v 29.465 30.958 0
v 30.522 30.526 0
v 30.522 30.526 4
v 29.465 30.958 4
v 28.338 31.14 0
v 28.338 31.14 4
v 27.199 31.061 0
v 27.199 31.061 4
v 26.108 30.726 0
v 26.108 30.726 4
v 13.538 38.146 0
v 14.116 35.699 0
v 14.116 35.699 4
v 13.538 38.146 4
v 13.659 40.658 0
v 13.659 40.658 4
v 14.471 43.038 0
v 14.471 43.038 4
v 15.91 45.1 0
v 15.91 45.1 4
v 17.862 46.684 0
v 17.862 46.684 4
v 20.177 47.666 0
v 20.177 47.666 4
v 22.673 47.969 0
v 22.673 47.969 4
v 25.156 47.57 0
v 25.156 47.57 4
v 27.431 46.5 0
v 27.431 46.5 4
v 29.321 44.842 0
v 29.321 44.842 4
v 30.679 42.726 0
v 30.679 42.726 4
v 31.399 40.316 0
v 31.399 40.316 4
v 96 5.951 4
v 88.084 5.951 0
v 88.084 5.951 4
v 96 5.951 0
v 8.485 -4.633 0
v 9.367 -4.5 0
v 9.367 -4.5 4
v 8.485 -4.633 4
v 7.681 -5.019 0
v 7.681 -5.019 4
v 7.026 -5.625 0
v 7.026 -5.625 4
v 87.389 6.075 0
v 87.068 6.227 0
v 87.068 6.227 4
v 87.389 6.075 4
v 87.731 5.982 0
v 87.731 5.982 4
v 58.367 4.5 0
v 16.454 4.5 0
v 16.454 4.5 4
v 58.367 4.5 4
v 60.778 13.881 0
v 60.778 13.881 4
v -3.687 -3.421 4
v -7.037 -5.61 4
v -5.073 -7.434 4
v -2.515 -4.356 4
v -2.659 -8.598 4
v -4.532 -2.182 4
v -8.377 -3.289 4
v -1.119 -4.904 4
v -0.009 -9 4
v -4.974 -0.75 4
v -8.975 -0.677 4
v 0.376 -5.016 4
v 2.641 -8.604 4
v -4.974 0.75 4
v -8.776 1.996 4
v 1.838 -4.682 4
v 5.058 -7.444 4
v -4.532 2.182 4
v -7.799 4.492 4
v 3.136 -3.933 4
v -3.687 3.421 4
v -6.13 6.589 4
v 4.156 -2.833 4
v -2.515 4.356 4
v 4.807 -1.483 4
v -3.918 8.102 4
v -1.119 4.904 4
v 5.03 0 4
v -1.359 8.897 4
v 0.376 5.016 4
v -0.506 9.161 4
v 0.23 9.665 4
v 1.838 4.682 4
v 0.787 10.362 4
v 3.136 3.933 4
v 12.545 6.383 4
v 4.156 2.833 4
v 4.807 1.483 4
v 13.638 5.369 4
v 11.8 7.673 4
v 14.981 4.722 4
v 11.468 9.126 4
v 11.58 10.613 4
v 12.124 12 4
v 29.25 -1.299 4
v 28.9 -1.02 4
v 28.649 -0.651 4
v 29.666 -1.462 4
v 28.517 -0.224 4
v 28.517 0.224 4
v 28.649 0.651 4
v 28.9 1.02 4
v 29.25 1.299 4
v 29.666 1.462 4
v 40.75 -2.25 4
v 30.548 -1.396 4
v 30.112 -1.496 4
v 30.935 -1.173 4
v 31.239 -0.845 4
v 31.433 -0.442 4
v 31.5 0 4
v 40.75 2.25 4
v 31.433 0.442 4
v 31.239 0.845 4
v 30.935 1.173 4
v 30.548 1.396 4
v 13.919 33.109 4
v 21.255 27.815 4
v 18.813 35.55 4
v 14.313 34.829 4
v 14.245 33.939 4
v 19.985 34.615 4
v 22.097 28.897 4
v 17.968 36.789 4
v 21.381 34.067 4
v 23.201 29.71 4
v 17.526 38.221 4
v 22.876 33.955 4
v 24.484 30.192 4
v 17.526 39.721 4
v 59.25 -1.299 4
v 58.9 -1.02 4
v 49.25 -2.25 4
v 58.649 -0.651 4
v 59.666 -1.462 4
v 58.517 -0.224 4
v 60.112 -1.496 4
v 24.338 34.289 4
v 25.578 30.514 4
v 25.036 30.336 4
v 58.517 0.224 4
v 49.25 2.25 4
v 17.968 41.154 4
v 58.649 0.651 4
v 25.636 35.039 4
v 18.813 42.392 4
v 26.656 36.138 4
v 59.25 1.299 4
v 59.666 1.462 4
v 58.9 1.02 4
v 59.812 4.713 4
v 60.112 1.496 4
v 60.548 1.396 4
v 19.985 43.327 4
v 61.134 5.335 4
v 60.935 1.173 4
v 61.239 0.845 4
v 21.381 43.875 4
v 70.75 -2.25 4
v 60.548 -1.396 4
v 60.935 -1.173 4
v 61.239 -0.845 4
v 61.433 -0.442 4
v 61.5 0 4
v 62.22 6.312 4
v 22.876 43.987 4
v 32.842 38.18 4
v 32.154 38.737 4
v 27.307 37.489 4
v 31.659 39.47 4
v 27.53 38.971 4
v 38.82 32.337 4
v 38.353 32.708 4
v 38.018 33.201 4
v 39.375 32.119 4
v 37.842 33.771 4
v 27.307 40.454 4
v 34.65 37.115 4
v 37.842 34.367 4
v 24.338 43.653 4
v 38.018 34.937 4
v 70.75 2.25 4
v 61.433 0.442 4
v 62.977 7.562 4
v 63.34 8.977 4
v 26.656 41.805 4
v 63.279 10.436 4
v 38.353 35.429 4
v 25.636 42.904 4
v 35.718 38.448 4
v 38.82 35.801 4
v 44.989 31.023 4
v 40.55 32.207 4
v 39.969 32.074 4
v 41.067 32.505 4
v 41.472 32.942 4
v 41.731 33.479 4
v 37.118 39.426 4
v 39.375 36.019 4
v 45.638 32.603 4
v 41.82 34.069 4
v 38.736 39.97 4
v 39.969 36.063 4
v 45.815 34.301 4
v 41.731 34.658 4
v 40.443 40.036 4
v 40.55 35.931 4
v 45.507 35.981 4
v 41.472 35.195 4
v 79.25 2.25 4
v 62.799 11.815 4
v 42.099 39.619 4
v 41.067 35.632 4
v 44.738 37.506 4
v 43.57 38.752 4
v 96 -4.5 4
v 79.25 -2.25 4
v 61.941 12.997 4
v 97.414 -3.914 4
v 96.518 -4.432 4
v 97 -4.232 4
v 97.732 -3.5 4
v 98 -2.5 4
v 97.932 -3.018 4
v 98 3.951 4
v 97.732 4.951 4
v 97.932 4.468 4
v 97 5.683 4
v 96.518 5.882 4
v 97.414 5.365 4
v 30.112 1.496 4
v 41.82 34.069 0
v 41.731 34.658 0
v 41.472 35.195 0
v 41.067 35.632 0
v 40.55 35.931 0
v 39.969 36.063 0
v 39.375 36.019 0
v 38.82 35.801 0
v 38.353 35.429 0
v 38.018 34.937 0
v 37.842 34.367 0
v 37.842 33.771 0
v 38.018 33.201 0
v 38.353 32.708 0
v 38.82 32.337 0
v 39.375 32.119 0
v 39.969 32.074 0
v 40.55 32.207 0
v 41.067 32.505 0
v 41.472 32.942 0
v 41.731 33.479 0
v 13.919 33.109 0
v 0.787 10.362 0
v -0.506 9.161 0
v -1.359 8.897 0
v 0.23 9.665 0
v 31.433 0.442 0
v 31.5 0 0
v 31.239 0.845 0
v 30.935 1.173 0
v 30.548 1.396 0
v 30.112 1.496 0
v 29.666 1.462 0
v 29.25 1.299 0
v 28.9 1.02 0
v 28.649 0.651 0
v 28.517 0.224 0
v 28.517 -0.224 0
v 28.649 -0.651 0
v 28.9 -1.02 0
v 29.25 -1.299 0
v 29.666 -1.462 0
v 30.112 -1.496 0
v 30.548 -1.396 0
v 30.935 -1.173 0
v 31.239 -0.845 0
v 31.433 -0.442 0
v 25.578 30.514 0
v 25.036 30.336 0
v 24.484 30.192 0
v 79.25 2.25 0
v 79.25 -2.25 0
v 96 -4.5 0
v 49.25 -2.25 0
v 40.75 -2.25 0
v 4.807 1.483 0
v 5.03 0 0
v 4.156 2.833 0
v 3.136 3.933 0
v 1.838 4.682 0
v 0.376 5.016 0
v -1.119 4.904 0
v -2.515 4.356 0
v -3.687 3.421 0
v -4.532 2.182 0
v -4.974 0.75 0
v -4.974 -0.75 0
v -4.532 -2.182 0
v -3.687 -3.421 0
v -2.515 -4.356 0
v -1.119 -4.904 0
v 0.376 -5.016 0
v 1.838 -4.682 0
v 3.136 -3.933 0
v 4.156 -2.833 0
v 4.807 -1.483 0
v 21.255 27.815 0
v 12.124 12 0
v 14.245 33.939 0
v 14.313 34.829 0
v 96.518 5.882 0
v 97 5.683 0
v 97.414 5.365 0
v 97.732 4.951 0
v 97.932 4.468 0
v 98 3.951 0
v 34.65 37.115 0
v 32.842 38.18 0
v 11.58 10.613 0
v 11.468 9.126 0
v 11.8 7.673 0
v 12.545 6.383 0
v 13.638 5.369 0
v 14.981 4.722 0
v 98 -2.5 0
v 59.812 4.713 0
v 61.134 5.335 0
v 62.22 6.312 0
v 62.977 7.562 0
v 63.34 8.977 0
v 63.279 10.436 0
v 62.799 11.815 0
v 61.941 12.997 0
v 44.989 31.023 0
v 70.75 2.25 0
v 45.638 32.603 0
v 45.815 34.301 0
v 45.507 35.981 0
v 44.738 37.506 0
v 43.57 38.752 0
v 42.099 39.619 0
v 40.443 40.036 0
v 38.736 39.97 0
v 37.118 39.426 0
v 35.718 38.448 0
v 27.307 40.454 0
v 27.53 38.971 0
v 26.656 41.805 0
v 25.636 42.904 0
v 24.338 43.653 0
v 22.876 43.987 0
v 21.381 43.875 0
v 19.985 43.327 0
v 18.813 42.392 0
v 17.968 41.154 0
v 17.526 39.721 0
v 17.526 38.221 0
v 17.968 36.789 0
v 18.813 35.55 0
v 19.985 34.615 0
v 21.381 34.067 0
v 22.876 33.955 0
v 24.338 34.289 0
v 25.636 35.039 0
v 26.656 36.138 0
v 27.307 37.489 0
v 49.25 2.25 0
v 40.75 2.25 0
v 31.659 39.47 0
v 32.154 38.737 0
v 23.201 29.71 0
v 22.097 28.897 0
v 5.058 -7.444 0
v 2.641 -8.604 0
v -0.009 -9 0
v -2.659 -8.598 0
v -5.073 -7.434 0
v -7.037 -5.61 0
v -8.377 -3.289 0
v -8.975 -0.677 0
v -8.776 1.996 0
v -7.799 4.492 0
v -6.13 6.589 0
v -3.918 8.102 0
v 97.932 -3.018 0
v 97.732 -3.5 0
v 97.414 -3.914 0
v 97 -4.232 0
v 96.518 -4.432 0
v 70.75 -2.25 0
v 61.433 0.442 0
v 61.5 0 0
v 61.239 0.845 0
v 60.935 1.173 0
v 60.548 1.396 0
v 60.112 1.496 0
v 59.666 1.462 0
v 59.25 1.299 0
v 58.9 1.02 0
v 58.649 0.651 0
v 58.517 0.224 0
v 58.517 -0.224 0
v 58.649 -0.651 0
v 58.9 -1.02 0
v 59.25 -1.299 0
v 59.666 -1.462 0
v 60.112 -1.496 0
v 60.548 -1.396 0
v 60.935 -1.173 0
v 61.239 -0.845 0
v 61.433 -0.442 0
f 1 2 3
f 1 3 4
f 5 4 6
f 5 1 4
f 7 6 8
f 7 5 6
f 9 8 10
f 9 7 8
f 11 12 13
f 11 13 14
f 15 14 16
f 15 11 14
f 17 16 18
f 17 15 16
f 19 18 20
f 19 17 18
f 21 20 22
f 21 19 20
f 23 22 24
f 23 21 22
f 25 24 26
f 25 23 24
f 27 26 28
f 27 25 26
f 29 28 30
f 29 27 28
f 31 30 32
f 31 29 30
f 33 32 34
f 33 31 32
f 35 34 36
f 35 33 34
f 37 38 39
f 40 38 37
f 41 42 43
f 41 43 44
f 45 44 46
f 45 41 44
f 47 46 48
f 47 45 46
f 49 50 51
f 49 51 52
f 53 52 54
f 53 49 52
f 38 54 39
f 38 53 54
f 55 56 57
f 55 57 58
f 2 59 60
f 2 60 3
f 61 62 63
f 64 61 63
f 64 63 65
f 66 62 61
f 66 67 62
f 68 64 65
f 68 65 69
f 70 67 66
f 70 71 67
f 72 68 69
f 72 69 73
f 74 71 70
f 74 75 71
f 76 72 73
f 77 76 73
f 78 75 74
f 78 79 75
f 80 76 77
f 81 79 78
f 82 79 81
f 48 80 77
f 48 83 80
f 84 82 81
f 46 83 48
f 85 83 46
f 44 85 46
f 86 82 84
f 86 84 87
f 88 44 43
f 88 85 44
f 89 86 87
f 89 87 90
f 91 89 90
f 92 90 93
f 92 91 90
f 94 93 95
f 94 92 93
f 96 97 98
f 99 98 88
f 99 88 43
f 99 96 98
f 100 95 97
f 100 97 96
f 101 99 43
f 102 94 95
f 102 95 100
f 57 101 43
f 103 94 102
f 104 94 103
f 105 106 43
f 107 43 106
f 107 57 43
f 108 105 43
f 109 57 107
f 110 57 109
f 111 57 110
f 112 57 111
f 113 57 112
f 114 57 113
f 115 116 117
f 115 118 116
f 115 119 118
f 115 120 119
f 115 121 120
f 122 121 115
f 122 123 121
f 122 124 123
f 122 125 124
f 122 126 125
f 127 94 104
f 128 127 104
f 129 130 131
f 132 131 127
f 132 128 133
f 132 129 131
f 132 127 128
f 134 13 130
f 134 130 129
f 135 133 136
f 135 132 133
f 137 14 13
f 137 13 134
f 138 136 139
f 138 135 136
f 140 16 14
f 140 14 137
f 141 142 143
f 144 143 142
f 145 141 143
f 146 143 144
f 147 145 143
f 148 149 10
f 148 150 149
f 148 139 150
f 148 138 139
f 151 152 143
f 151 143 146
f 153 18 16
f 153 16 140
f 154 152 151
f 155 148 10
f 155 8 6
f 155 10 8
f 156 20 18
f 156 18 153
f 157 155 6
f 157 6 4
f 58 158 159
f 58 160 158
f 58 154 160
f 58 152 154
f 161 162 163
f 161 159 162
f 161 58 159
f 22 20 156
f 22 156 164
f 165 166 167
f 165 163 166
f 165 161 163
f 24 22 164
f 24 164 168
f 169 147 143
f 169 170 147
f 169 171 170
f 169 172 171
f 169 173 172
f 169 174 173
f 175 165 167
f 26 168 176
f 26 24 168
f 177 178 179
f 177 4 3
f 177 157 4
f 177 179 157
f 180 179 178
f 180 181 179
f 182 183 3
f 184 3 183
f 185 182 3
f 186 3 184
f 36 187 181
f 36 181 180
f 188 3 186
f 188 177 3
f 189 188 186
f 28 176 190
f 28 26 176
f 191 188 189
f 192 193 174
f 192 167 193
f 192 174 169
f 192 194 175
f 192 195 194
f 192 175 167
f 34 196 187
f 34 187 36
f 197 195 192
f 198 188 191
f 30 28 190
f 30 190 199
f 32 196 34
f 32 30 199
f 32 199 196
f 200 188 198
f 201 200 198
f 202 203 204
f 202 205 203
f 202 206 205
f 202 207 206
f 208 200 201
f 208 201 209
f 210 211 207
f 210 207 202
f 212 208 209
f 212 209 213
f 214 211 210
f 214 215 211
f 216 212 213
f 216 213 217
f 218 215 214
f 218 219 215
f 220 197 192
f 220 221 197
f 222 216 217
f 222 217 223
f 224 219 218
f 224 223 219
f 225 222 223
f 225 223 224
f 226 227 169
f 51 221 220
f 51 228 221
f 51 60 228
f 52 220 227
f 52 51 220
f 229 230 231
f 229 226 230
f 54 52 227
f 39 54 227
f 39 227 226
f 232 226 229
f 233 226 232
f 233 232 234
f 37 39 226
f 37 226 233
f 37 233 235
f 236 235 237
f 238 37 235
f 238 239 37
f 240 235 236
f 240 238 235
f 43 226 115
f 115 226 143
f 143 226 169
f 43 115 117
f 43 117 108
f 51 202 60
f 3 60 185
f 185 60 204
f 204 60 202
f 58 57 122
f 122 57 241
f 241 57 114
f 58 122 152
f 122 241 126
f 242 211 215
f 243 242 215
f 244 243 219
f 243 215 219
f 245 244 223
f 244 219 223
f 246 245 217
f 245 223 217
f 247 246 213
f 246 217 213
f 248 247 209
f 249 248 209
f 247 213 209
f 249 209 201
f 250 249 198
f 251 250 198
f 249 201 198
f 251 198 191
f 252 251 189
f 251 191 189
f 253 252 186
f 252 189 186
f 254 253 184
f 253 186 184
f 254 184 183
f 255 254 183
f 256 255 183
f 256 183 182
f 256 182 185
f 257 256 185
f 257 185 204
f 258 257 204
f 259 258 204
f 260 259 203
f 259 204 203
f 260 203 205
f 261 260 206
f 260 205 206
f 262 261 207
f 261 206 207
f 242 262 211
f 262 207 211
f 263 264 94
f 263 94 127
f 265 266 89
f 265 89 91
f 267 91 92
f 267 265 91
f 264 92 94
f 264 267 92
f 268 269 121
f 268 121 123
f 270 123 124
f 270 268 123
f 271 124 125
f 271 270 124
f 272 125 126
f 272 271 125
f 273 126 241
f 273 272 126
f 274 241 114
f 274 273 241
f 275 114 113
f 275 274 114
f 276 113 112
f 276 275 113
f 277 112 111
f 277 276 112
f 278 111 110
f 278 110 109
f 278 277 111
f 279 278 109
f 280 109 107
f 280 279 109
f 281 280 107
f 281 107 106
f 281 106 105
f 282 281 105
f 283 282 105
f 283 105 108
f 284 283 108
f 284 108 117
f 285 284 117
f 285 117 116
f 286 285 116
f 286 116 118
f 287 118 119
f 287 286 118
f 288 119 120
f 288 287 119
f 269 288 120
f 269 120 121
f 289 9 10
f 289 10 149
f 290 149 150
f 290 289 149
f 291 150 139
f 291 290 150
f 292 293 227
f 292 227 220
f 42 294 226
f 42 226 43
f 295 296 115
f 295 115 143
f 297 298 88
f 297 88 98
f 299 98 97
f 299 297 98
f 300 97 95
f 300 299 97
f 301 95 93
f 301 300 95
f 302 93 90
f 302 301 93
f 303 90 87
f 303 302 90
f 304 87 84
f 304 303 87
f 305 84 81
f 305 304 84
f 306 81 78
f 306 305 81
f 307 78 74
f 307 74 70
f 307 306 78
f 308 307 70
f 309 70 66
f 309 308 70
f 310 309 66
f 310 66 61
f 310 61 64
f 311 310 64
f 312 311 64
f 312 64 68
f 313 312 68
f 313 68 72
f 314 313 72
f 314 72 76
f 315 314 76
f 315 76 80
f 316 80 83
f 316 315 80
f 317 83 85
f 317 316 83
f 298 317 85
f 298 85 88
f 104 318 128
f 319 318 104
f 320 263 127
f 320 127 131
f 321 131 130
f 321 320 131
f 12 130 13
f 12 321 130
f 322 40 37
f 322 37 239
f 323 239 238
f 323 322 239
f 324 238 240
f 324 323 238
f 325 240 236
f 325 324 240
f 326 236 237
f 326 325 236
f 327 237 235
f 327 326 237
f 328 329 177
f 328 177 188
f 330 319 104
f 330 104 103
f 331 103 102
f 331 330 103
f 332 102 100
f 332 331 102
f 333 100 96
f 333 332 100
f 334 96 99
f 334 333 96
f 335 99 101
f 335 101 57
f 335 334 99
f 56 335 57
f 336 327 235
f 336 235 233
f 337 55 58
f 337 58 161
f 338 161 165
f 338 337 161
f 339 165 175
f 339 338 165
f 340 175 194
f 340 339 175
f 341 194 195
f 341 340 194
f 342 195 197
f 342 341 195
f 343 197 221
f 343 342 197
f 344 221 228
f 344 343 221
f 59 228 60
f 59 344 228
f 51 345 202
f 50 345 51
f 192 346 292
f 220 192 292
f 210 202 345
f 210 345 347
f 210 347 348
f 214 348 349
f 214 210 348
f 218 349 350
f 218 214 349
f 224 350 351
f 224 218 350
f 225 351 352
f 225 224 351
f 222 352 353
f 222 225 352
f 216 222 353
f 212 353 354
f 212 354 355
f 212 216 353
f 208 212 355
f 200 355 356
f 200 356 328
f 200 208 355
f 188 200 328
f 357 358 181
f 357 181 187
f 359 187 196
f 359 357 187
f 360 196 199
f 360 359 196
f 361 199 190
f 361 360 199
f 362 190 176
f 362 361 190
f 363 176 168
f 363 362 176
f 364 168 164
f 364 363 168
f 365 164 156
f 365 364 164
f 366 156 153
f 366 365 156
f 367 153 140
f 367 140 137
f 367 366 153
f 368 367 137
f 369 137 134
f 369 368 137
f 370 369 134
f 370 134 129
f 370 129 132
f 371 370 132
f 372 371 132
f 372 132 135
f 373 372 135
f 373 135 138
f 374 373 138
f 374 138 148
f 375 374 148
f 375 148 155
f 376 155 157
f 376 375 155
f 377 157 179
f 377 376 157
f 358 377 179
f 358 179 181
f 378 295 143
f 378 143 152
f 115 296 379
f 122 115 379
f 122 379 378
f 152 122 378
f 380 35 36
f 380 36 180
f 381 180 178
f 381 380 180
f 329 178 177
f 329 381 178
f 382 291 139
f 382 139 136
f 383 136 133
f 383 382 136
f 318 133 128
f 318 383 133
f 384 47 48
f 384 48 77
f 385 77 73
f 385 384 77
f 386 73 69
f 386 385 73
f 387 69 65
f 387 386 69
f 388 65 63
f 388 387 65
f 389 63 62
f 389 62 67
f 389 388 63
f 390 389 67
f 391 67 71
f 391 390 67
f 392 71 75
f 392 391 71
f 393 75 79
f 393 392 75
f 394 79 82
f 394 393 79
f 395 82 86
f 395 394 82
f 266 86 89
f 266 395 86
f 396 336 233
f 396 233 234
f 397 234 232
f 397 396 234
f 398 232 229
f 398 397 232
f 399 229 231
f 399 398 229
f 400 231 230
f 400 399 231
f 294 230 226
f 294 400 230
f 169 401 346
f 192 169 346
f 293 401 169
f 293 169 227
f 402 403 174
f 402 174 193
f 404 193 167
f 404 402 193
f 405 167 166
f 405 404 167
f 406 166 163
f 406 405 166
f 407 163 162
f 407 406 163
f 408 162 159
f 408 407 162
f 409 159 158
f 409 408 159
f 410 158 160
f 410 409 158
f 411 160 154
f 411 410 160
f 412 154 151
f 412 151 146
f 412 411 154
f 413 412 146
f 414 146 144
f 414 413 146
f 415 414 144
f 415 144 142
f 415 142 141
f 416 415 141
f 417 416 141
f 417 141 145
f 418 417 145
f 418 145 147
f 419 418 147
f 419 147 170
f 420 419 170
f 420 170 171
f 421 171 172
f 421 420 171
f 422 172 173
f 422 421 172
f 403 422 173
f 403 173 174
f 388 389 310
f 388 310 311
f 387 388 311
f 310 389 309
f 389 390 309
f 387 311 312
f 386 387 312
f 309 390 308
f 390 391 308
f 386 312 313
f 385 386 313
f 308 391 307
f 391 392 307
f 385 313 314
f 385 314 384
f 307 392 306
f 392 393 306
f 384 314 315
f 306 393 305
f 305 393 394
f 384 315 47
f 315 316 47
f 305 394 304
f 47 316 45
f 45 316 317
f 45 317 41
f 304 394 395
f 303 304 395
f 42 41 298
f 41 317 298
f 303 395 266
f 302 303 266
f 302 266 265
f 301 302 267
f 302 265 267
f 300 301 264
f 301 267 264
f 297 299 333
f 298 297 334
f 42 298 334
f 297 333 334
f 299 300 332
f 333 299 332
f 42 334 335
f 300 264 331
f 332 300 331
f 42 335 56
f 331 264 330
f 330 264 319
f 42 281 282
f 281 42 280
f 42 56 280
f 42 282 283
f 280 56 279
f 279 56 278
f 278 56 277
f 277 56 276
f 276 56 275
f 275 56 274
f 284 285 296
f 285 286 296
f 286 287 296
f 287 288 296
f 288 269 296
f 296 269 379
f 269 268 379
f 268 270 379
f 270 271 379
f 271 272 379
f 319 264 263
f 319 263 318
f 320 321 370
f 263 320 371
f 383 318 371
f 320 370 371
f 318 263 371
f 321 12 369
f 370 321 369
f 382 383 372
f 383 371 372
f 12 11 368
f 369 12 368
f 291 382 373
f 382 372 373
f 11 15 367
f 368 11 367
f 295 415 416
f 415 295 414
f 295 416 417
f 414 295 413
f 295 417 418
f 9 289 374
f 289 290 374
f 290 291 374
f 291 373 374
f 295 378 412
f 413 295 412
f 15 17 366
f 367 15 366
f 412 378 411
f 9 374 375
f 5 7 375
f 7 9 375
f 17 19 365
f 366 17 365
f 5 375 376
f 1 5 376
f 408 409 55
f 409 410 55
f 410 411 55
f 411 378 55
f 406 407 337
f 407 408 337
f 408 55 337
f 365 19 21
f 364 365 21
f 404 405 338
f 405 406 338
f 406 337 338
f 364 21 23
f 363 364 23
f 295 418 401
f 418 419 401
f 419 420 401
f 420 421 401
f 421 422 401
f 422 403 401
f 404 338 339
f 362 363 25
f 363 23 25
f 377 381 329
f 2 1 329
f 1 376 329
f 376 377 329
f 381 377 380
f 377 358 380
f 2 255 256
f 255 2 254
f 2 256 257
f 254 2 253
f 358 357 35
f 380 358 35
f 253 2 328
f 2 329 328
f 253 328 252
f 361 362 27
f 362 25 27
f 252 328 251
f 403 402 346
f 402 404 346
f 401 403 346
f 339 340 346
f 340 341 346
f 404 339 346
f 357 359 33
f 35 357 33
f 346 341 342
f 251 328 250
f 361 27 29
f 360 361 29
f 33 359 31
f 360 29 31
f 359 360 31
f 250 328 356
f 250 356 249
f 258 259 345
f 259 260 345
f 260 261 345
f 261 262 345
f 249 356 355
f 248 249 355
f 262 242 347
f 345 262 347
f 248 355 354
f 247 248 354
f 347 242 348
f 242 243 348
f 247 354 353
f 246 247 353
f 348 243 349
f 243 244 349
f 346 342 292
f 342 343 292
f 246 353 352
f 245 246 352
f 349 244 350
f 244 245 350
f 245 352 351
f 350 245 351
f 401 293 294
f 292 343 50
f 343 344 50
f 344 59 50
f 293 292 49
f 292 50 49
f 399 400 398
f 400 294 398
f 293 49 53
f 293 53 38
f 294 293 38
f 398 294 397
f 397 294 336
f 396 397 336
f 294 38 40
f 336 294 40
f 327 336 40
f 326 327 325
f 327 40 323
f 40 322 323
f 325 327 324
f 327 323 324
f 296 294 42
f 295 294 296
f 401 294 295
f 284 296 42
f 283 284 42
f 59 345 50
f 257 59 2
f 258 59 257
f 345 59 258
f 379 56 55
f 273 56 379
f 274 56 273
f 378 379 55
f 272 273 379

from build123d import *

# Parameters (mm, degrees)
SKETCH_1_R          = 5.03
SKETCH_1_R_2        = 1.5
SKETCH_1_W          = 8.5
SKETCH_1_H          = 4.5
EXTRUDE_1_DEPTH     = 4
SKETCH_2_R          = 6
EXTRUDE_2_DEPTH     = 4
SKETCH_3_R          = 2
CUT_EXTRUDE_1_DEPTH = 4


with BuildPart() as part:
    # 草图1 → 凸台-拉伸1 (new body)
    with BuildSketch(Plane.XY):
        with BuildLine():
            Line((87, -4.5), (9.367496998, -4.5))
            ThreePointArc((9.367496998, -4.5), (8.068458892, -4.795836543), (7.025622748, -5.625))
            ThreePointArc((7.025622748, -5.625), (-7.794228634, -4.5), (-1.358581522, 8.896867777))
            ThreePointArc((-1.358581522, 8.896867777), (-0.119086833, 9.385408641), (0.786634182, 10.36249037))
            Line((0.786634182, 10.36249037), (13.919137184, 33.108652801))
            ThreePointArc((13.919137184, 33.108652801), (14.312454275, 34.381571072), (14.11579573, 35.699275393))
            ThreePointArc((14.11579573, 35.699275393), (20.177098522, 47.666206639), (31.398879943, 40.316481698))
            ThreePointArc((31.398879943, 40.316481698), (31.879352208, 39.085435776), (32.842164256, 38.180272466))
            Line((32.842164256, 38.180272466), (87.068435314, 6.227425402))
            ThreePointArc((87.068435314, 6.227425402), (87.55756519, 6.02099445), (88.083774649, 5.950529007))
            Line((88.083774649, 5.950529007), (96, 5.950529007))
            ThreePointArc((96, 5.950529007), (97.414213562, 5.364742569), (98, 3.950529007))
            Line((98, 3.950529007), (98, 0))
            Line((98, 0), (98, -2.5))
            ThreePointArc((98, -2.5), (97.414213562, -3.914213562), (96, -4.5))
            Line((96, -4.5), (87, -4.5))
        make_face()
        Circle(SKETCH_1_R, mode=Mode.SUBTRACT)
        with Locations((22.5, 38.97114317)):
            Circle(SKETCH_1_R, mode=Mode.SUBTRACT)
        with Locations((30, 0)):
            Circle(SKETCH_1_R_2, mode=Mode.SUBTRACT)
        with Locations((60, 0)):
            Circle(SKETCH_1_R_2, mode=Mode.SUBTRACT)
        with Locations((45, 0)):
            Rectangle(SKETCH_1_W, SKETCH_1_H, mode=Mode.SUBTRACT)
        with BuildLine():
            Line((21.255373367, 27.815386605), (12.124355653, 12))
            ThreePointArc((12.124355653, 12), (12.124355653, 7), (16.454482672, 4.5))
            Line((16.454482672, 4.5), (58.367468971, 4.5))
            ThreePointArc((58.367468971, 4.5), (63.210197148, 8.25582003), (60.777559131, 13.880806481))
            Line((60.777559131, 13.880806481), (30.521886072, 30.525892321))
            ThreePointArc((30.521886072, 30.525892321), (28.338019103, 31.139965525), (26.107583087, 30.725820601))
            ThreePointArc((26.107583087, 30.725820601), (25.308251431, 30.420486827), (24.483535962, 30.192442521))
            ThreePointArc((24.483535962, 30.192442521), (22.620790776, 29.341612745), (21.255373367, 27.815386605))
        make_face(mode=Mode.SUBTRACT)
        with Locations((75, 0)):
            Rectangle(SKETCH_1_W, SKETCH_1_H, mode=Mode.SUBTRACT)
    extrude(amount=EXTRUDE_1_DEPTH)

    # 草图2 → 凸台-拉伸2 (add)
    with BuildSketch(Plane.XY.offset(4)):
        with Locations((39.819566523, 34.068836013)):
            Circle(SKETCH_2_R)
    extrude(amount=-EXTRUDE_2_DEPTH)

    # 草图3 → 切除-拉伸1 (cut)
    with BuildSketch(Plane.XY.offset(4)):
        with Locations((39.819566523, 34.068836013)):
            Circle(SKETCH_3_R)
    extrude(amount=-CUT_EXTRUDE_1_DEPTH, mode=Mode.SUBTRACT)


solid = part.part
